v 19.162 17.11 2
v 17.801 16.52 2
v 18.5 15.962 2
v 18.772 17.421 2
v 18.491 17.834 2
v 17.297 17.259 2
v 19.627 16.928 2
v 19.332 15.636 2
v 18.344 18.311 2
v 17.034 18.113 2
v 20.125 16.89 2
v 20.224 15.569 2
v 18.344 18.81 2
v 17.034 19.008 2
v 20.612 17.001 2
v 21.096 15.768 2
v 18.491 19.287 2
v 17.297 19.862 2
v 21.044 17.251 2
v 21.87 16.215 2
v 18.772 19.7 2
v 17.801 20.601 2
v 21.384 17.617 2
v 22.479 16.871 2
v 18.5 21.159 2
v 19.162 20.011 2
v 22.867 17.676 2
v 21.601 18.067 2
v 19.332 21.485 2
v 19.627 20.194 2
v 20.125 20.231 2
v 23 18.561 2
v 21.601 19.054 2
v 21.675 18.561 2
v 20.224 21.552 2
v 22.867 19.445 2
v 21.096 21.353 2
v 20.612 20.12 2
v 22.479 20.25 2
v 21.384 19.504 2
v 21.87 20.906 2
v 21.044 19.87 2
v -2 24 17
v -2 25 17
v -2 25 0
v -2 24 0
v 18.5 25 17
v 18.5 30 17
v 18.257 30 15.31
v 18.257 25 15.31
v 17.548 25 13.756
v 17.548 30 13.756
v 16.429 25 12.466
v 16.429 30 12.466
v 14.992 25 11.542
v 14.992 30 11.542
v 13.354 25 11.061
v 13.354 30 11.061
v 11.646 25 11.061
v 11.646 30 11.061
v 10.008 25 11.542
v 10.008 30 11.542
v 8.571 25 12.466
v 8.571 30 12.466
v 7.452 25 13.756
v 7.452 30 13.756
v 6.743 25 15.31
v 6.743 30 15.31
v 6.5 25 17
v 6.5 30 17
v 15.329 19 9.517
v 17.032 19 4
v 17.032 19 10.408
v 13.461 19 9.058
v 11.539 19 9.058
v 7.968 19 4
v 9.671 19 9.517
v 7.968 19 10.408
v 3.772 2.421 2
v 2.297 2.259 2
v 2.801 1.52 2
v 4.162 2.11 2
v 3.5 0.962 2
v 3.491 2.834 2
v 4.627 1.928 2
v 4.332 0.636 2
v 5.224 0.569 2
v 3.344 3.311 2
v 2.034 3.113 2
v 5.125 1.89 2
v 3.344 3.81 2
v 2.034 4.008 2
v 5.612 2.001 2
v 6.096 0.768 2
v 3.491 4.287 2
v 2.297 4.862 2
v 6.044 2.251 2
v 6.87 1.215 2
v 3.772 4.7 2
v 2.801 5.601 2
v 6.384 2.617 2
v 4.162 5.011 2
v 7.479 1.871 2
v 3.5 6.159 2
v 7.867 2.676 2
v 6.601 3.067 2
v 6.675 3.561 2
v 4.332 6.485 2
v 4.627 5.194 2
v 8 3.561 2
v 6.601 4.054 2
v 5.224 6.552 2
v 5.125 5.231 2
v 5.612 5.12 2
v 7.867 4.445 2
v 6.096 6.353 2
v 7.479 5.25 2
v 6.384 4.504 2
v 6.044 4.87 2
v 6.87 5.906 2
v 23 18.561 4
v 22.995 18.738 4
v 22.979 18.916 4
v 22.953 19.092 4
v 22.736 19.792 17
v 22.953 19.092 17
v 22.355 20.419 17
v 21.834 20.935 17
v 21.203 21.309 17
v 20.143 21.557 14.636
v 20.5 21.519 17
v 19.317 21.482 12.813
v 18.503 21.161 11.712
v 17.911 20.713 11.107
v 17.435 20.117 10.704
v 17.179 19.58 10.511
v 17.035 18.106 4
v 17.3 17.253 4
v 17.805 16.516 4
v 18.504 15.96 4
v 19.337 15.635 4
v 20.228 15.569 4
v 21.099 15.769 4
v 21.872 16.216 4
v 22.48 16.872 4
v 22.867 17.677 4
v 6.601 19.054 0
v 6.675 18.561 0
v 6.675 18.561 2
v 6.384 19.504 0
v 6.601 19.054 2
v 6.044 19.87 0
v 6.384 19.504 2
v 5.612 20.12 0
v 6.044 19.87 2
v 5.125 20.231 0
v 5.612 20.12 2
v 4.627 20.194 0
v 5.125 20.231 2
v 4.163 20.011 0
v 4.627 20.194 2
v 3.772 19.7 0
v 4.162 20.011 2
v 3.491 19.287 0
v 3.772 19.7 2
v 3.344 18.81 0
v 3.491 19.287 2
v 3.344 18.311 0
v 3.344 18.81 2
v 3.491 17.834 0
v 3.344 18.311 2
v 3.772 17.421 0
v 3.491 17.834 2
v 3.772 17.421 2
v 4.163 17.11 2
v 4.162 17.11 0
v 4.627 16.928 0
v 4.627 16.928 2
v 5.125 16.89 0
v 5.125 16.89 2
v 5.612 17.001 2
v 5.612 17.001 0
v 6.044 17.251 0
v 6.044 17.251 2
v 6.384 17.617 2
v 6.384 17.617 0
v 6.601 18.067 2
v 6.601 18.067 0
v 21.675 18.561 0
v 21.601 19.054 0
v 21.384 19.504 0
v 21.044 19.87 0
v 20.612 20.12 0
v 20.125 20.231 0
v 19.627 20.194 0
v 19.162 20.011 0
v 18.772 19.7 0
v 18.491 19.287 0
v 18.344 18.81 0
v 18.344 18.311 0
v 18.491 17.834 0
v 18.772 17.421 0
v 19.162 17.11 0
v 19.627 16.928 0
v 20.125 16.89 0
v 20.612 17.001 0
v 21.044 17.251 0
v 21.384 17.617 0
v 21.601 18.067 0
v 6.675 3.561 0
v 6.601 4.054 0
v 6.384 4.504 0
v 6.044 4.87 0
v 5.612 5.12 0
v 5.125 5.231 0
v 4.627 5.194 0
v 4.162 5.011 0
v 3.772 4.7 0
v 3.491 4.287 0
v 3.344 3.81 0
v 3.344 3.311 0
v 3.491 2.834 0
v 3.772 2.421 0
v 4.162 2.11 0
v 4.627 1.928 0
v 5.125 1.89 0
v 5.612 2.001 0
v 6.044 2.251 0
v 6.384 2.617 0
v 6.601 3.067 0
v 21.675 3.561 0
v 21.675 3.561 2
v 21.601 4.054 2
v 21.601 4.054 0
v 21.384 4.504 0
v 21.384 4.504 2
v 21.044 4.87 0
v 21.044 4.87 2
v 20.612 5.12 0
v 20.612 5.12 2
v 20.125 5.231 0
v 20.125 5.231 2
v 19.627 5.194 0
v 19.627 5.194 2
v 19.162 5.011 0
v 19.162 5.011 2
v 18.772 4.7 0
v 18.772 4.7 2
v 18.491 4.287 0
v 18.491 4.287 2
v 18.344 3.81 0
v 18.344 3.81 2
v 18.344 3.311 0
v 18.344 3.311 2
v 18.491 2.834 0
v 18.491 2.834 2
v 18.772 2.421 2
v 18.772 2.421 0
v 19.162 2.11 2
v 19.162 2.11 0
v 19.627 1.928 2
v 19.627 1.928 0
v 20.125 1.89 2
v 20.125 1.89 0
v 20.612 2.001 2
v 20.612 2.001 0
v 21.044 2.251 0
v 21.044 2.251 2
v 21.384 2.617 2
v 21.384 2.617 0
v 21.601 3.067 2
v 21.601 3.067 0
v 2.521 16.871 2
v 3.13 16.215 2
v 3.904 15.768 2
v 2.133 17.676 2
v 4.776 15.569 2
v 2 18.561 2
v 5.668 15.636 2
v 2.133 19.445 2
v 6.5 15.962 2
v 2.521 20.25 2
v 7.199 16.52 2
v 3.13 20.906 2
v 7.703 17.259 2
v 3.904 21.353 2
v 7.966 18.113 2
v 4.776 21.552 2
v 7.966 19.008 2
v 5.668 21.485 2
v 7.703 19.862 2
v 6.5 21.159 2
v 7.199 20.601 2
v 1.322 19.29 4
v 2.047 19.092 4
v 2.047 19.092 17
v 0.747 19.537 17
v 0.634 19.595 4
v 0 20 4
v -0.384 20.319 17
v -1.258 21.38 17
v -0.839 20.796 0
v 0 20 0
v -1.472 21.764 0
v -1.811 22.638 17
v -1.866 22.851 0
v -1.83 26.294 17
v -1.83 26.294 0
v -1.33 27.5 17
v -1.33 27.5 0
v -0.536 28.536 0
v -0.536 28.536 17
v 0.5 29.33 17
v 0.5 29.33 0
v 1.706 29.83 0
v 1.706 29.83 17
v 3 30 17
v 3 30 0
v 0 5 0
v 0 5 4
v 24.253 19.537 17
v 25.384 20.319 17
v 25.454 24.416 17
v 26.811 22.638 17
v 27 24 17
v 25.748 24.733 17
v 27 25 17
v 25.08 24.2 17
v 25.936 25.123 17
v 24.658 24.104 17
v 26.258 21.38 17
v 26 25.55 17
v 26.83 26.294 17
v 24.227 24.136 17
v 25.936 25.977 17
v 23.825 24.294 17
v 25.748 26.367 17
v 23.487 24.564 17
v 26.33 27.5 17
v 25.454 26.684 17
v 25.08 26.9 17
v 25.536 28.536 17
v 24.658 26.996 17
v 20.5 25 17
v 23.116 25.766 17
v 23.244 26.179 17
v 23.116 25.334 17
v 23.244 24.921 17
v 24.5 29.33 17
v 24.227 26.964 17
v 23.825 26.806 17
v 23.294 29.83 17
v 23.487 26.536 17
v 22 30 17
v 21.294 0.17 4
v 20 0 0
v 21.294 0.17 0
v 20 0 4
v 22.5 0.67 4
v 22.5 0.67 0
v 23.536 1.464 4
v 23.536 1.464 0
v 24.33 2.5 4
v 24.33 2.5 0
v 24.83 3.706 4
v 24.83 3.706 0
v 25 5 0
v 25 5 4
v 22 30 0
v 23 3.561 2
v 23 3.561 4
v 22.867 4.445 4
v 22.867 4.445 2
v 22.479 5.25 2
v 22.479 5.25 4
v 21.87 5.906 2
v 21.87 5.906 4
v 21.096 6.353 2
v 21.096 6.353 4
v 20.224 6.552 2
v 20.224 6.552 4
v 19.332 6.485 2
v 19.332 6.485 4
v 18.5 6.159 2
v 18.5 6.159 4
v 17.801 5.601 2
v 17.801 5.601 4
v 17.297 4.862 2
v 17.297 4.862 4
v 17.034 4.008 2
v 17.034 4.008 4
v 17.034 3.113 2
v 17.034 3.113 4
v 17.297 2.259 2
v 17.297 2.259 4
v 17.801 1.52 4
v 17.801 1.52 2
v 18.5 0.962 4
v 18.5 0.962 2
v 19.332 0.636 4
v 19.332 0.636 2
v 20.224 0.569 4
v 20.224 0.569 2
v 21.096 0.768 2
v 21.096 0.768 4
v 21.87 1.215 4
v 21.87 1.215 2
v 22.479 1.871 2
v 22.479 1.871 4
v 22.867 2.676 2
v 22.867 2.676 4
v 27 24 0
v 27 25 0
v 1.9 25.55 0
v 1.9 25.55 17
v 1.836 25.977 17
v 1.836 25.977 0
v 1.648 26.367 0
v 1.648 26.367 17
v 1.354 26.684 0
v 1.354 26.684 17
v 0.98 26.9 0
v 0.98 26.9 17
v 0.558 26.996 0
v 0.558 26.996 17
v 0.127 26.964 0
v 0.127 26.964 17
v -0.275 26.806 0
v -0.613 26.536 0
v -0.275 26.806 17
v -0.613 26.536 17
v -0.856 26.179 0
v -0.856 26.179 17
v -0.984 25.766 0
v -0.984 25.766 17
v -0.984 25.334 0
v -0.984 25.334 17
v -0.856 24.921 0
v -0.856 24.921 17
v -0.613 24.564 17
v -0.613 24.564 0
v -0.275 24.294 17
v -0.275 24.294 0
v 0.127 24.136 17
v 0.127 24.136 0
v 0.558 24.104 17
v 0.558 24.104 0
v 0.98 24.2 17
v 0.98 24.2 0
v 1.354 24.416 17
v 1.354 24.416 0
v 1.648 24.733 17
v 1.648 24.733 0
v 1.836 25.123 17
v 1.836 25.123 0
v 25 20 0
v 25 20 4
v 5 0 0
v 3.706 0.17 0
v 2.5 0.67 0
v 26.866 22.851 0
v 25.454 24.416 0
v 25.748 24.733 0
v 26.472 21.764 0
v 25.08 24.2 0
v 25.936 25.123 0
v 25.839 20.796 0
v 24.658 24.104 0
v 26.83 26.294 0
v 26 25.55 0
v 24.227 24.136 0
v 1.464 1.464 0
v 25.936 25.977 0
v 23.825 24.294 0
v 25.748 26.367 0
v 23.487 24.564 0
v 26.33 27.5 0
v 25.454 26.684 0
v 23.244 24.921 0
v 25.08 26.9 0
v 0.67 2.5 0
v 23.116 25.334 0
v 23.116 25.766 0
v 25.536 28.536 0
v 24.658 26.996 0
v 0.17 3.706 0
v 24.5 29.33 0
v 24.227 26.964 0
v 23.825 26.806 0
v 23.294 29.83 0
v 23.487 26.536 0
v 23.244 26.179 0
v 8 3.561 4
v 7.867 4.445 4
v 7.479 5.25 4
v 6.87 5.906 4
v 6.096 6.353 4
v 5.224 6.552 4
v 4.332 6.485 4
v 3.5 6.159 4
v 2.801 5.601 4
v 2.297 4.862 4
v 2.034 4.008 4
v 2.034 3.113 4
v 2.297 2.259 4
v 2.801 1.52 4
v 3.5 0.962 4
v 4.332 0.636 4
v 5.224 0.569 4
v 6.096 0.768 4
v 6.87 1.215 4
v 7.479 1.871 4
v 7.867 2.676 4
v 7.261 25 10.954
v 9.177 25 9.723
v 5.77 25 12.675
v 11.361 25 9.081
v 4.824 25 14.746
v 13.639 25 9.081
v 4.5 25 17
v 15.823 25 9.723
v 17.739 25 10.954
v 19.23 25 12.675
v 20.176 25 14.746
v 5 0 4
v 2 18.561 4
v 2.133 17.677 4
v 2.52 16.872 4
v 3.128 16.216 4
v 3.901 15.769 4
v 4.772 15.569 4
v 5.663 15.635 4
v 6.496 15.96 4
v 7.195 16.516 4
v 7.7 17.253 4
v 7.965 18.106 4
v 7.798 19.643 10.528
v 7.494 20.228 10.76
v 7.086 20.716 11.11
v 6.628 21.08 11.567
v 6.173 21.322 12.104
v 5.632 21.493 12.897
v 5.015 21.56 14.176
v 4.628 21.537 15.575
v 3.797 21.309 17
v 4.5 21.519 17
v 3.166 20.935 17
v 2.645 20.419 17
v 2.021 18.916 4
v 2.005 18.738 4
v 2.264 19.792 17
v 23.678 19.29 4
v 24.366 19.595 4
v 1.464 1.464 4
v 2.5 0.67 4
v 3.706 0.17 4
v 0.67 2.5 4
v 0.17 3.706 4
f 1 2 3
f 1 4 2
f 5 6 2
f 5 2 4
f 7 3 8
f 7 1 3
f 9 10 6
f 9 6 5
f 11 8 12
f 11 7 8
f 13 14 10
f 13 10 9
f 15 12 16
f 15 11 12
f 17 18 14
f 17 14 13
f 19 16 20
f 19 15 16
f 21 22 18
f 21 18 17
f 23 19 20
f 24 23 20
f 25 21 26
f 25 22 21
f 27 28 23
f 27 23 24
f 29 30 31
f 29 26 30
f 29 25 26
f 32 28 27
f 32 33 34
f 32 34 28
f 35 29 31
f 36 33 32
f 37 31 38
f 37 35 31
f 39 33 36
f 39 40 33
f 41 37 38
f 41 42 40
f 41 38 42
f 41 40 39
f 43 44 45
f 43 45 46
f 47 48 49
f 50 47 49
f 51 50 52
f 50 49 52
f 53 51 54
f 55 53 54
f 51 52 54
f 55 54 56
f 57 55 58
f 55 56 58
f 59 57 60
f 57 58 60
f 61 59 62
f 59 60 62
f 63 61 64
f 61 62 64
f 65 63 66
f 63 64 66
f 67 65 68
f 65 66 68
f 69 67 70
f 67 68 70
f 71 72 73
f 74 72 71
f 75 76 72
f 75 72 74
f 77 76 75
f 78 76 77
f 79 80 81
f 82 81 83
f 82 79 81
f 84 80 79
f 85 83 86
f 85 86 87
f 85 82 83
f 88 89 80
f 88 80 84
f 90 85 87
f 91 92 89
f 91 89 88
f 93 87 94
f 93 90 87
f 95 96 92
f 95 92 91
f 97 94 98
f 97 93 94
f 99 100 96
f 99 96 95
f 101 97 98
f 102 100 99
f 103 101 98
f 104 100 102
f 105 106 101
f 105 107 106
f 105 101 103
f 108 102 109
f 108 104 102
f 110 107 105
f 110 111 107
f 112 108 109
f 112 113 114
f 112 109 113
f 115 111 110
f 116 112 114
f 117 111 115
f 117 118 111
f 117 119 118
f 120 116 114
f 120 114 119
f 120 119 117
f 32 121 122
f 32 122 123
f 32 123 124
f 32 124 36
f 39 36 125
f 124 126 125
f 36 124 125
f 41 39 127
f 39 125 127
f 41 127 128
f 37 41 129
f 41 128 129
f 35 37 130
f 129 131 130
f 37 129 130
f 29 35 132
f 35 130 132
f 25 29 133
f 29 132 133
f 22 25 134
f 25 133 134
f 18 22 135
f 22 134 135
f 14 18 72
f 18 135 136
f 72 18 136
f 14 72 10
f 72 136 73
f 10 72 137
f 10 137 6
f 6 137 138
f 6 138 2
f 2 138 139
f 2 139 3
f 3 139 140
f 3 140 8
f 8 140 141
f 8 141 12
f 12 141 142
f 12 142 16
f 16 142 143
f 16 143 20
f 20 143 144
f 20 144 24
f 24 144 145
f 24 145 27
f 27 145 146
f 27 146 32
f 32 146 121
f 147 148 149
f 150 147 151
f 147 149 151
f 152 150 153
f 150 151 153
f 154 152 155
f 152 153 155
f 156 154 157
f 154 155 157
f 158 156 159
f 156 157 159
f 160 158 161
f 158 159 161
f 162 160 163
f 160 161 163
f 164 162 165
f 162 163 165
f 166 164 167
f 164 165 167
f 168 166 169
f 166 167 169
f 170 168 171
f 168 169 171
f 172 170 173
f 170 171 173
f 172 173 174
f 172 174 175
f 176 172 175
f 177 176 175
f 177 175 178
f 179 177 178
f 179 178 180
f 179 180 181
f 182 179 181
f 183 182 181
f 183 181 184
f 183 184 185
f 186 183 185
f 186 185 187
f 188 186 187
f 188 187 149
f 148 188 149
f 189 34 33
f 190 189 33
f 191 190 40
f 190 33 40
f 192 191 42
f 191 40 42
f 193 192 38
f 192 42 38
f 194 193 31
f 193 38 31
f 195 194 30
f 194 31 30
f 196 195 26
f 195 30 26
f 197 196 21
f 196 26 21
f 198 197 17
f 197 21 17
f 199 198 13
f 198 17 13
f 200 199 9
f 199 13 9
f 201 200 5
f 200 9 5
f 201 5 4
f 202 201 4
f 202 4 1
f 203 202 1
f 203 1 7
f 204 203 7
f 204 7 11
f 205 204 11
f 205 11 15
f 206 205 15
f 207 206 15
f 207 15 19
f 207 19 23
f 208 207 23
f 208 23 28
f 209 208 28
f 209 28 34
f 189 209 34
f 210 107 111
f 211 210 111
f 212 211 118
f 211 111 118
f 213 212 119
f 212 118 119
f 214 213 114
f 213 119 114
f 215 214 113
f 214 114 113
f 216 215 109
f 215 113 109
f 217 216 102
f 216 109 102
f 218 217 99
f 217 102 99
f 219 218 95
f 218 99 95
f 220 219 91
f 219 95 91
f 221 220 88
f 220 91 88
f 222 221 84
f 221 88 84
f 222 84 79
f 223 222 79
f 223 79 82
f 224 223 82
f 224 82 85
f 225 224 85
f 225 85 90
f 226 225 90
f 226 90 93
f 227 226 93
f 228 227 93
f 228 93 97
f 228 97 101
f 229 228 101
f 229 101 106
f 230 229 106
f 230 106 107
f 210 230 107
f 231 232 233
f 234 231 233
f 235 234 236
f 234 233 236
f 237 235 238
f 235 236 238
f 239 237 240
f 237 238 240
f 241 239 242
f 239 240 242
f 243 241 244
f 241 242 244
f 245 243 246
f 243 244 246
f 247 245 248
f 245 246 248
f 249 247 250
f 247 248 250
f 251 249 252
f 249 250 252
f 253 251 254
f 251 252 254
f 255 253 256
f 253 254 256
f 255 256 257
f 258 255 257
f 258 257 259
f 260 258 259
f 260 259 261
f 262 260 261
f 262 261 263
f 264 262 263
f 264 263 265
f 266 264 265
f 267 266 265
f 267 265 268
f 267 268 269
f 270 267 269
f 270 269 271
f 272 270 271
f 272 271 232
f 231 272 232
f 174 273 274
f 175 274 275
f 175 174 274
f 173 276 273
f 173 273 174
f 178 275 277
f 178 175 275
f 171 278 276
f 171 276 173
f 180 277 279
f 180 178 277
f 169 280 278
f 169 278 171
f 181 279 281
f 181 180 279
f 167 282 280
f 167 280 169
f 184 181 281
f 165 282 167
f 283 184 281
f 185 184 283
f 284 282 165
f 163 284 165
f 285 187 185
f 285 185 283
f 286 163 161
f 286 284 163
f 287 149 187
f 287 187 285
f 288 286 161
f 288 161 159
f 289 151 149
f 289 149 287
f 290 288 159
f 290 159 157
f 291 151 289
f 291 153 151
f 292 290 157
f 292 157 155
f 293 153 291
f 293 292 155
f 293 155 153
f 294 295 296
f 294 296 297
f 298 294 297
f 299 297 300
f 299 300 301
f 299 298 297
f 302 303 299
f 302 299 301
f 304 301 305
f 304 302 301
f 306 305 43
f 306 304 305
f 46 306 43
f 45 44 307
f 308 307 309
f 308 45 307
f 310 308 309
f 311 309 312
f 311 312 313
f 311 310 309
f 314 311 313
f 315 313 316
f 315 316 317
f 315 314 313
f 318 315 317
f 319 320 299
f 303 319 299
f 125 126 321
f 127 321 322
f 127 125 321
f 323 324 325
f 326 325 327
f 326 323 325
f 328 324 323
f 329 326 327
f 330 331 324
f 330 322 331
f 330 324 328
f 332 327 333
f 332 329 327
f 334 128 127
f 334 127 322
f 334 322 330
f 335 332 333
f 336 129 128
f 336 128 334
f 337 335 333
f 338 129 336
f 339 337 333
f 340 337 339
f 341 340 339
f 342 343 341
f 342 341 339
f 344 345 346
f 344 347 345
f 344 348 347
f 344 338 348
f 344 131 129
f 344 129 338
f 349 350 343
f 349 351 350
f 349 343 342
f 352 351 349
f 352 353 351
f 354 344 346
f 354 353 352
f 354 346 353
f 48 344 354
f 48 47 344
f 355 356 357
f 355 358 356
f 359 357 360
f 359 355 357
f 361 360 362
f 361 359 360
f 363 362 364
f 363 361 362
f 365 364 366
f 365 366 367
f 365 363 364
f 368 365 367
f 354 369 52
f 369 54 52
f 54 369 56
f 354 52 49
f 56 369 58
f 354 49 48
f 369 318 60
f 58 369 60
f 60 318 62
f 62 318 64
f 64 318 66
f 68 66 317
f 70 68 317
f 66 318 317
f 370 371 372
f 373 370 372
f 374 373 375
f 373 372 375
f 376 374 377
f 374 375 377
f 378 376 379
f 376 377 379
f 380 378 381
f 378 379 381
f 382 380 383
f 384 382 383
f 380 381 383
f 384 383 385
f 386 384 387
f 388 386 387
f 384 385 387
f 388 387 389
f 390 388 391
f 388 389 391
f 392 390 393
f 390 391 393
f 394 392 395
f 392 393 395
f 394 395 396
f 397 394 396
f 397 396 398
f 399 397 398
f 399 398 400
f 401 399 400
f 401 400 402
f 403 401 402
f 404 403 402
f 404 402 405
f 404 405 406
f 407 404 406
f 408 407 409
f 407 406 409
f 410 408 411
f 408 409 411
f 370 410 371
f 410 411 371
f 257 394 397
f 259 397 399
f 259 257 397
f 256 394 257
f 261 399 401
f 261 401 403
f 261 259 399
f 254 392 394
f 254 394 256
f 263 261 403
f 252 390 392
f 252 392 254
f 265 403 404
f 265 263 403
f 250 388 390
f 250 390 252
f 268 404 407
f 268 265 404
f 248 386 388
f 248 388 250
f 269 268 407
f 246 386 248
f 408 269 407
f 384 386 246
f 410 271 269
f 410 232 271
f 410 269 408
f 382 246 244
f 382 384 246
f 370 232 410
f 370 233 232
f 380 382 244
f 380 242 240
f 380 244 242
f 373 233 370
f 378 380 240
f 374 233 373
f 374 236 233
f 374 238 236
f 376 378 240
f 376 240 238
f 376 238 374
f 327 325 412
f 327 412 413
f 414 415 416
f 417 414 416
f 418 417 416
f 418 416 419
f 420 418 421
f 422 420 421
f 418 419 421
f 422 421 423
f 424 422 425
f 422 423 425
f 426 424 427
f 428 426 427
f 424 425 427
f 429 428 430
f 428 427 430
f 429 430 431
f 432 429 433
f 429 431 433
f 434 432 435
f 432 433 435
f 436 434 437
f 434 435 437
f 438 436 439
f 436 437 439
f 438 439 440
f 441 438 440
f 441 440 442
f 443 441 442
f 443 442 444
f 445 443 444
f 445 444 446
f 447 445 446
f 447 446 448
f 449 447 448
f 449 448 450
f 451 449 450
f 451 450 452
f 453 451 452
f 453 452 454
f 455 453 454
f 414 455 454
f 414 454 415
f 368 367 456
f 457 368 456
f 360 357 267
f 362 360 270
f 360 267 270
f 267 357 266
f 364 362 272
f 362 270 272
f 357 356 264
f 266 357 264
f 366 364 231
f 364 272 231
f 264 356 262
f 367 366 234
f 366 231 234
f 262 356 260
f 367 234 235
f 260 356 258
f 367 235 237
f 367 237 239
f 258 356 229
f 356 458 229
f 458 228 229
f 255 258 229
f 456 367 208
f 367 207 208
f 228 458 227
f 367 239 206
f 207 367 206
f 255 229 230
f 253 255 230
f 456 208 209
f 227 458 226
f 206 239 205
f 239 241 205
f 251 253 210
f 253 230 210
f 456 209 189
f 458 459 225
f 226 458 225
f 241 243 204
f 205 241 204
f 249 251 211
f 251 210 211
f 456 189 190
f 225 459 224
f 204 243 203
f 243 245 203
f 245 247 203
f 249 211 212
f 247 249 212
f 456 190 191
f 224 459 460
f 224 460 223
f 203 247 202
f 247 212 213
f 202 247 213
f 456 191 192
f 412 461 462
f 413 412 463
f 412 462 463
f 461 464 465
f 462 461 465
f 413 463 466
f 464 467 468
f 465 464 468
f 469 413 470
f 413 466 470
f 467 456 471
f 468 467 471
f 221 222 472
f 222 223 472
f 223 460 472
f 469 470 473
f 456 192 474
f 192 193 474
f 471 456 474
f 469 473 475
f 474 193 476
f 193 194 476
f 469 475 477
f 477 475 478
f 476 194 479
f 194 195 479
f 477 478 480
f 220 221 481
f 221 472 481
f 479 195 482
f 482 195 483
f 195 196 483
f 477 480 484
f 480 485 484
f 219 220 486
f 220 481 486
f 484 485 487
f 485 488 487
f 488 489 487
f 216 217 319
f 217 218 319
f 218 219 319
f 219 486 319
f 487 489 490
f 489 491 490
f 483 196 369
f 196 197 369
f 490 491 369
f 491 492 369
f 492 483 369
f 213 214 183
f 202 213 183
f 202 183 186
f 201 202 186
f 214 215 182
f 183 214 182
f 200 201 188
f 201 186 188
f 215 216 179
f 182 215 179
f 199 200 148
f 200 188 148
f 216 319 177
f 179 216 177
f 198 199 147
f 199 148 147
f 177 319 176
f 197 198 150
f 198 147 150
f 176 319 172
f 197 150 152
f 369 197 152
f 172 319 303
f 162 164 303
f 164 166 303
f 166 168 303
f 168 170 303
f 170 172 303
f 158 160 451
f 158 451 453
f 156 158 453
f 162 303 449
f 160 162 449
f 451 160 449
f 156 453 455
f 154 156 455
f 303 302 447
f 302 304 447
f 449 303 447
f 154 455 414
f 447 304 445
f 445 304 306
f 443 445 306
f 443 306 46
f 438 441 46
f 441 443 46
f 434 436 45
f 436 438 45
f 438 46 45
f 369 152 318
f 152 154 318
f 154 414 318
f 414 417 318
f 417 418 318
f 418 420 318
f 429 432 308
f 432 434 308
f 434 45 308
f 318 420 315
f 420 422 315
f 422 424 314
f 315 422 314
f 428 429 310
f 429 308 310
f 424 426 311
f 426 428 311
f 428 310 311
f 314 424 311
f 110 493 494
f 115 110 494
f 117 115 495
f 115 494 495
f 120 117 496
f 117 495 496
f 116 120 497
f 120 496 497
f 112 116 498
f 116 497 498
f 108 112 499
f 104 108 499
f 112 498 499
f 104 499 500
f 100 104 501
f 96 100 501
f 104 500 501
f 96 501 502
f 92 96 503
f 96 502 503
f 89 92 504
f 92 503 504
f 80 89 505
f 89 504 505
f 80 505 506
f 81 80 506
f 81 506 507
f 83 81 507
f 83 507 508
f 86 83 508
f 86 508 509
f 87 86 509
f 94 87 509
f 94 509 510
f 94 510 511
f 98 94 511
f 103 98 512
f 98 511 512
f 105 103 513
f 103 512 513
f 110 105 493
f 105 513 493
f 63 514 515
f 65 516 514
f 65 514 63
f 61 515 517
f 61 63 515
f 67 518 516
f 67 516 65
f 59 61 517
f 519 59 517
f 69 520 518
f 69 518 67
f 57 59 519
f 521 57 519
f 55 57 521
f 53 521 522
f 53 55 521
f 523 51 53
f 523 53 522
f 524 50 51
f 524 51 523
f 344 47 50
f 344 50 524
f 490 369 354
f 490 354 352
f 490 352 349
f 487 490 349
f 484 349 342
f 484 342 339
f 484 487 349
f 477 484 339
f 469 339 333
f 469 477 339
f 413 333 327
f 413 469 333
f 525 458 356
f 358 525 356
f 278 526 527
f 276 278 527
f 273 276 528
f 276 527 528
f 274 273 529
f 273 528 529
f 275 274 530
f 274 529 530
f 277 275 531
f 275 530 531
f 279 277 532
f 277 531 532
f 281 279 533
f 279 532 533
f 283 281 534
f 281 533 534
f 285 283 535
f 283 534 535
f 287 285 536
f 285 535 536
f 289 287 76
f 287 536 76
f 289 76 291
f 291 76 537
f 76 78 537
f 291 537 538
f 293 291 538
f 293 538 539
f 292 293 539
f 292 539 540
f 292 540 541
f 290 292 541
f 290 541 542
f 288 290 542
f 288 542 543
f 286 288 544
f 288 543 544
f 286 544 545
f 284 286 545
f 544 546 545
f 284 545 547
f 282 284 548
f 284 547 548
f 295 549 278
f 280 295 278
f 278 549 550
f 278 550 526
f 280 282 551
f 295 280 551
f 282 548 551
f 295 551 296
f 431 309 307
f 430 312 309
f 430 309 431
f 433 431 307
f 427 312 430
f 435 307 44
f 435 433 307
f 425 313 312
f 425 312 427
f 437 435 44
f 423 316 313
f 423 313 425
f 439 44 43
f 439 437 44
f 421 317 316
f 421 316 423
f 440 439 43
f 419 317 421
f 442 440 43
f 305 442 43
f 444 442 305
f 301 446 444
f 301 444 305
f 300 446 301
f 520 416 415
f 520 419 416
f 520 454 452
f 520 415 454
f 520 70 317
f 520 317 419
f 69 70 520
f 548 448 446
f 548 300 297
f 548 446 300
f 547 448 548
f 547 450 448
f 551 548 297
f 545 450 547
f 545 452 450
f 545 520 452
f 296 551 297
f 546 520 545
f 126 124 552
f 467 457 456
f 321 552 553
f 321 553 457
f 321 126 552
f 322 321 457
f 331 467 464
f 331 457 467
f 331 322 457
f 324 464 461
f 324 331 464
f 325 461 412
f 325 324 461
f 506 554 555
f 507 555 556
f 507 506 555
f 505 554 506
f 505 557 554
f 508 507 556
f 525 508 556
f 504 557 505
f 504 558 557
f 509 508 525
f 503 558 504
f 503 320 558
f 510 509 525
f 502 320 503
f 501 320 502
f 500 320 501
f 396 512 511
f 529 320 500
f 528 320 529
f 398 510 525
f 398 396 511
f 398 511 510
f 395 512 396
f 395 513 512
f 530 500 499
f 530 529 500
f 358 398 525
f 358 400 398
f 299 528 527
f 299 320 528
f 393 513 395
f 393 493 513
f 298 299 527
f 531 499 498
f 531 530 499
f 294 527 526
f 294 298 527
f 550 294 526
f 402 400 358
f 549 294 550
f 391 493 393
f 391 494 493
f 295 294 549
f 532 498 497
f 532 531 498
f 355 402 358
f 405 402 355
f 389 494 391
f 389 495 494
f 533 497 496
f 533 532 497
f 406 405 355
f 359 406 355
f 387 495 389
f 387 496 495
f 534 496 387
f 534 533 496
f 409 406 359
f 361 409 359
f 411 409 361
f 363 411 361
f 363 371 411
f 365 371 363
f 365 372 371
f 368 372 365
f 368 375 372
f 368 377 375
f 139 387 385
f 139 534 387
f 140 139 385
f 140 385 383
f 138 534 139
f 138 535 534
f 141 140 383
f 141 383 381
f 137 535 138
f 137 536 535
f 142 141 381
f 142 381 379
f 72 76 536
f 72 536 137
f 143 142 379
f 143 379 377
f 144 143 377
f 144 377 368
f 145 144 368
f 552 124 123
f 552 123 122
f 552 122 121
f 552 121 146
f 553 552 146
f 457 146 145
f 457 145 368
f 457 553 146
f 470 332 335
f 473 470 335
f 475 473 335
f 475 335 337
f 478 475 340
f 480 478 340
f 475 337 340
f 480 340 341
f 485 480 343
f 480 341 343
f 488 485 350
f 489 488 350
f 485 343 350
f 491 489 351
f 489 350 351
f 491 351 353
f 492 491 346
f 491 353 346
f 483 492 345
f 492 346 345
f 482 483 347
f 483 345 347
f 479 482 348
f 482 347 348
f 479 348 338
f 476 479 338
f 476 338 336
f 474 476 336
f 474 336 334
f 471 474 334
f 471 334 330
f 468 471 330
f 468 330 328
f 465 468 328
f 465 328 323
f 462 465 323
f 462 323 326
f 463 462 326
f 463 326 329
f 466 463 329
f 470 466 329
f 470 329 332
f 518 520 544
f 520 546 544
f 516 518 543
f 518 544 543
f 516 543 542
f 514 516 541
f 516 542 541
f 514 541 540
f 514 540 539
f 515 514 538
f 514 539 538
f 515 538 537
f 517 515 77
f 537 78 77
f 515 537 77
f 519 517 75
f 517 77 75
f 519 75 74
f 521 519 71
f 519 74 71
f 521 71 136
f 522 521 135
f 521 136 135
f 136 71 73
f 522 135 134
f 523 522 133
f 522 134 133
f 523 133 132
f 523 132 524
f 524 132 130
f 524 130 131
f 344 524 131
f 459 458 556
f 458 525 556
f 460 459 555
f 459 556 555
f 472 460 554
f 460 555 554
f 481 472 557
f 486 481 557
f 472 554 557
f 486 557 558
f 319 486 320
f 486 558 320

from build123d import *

# Parameters (mm, degrees)
F0_W          = 25
F0_H          = 30
F1_DEPTH      = 4
F2_R          = 1.675
F3_DEPTH      = 25
F4_W          = 25
F4_H          = 11
F5_DEPTH      = 13
F7_DEPTH      = 6
F8_R          = 8
F9_DEPTH      = 6
F2_R_2        = 3
F10_DEPTH     = 2
F11_W         = 11
F11_H         = 17
F12_DEPTH     = 2
F13_R         = 5
F14_W         = 11
F14_H         = 17
F15_DEPTH     = 2
F16_DEPTH     = 2
F17_R         = 1.45
F18_DEPTH     = 25
F19_T1_DEPTH  = 42
F19_T6_DEPTH  = 42
F19_T11_DEPTH = 42
F19_T16_DEPTH = 42
F19_T21_DEPTH = 42
F20_DEPTH     = 25


# Not quite as in the source:
# - a fillet or chamfer that OpenCascade refuses, or shapes differently, is made with other operations: its cross-section is extruded or revolved along the edge and cut away or added


with BuildPart() as f1:
    # F0 (on Top) → F1 (new body)
    with BuildSketch(Plane.XY):
        with Locations((12.5, 15)):
            Rectangle(F0_W, F0_H)
    extrude(amount=F1_DEPTH)

    # F2 (on face) → F3 (cut)
    with BuildSketch(Plane.XY.offset(4)):
        with BuildLine():
            ThreePointArc((3.325, 18.5605346784), (5, 16.8855346784), (6.675, 18.5605346784))
            ThreePointArc((6.675, 18.5605346784), (5, 20.2355346784), (3.325, 18.5605346784))
        make_face()
        with Locations((20, 18.5605346784)):
            Circle(F2_R)
        with Locations((20, 3.5605346784)):
            Circle(F2_R)
        with Locations((5, 3.5605346784)):
            Circle(F2_R)
    extrude(amount=-F3_DEPTH, mode=Mode.SUBTRACT)

    # F4 (on face) → F5 (join)
    with BuildSketch(Plane.XY.offset(4)):
        with Locations((12.5, 24.5)):
            Rectangle(F4_W, F4_H)
    extrude(amount=F5_DEPTH)

    # F6 (on face) → F7 (cut)
    with BuildSketch(Plane(origin=(0, 30, 0), x_dir=(-1, 0, 0), z_dir=(0, 1, 0))):
        with BuildLine():
            ThreePointArc((-18.5, 17), (-12.5, 11), (-6.5, 17))
            Line((-6.5, 17), (-18.5, 17))
        make_face()
    extrude(amount=-F7_DEPTH, mode=Mode.SUBTRACT)

    # F8 (on face) → F9 (cut)
    with BuildSketch(Plane.XZ.offset(-19)):
        with Locations((12.5, 17)):
            Circle(F8_R)
    extrude(amount=-F9_DEPTH, mode=Mode.SUBTRACT)

    # F2 (on face) → F10 (cut)
    with BuildSketch(Plane.XY.offset(4)):
        with BuildLine():
            ThreePointArc((8, 18.5605346784), (5, 21.5605346784), (2, 18.5605346784))
            ThreePointArc((2, 18.5605346784), (5, 15.5605346784), (8, 18.5605346784))
        make_face()
        with BuildLine():
            ThreePointArc((3.325, 18.5605346784), (5, 20.2355346784), (6.675, 18.5605346784))
            ThreePointArc((6.675, 18.5605346784), (5, 16.8855346784), (3.325, 18.5605346784))
        make_face(mode=Mode.SUBTRACT)
        with Locations((20, 18.5605346784)):
            Circle(F2_R_2)
        with Locations((20, 18.5605346784)):
            Circle(F2_R, mode=Mode.SUBTRACT)
        with Locations((20, 3.5605346784)):
            Circle(F2_R_2)
        with Locations((20, 3.5605346784)):
            Circle(F2_R, mode=Mode.SUBTRACT)
        with Locations((5, 3.5605346784)):
            Circle(F2_R_2)
        with Locations((5, 3.5605346784)):
            Circle(F2_R, mode=Mode.SUBTRACT)
    extrude(amount=-F10_DEPTH, mode=Mode.SUBTRACT)

    # F11 (on face) → F12 (join)
    with BuildSketch(Plane(origin=(0, 0, 0), x_dir=(0, -1, 0), z_dir=(-1, 0, 0))):
        with Locations((-24.5, 8.5)):
            Rectangle(F11_W, F11_H)
    extrude(amount=F12_DEPTH)

    # F13
    f13_edges = [f1.edges().sort_by_distance(p)[0] for p in [
        (0, 0, 2),
        (25, 0, 2),
    ]]
    fillet(f13_edges, radius=F13_R)

    # F14 (on face) → F15 (join)
    with BuildSketch(Plane.YZ.offset(25)):
        with Locations((24.5, 8.5)):
            Rectangle(F14_W, F14_H)
    extrude(amount=F15_DEPTH)

    # F14 (on face) → F16 (join)
    with BuildSketch(Plane.YZ.offset(25)):
        with Locations((24.5, 8.5)):
            Rectangle(F14_W, F14_H)
    extrude(amount=F16_DEPTH)

    # F17 (on face) → F18 (cut)
    with BuildSketch(Plane.XY.offset(17)):
        with Locations((0.45, 25.55)):
            Circle(F17_R)
        with Locations((24.55, 25.55)):
            Circle(F17_R)
    extrude(amount=-F18_DEPTH, mode=Mode.SUBTRACT)

    # F19: fillet of radius 5 on 4 edges, made by hand

    # F19_s2 → F19_t1 (cut)
    with BuildSketch(Plane.XY.offset(-12.5)):
        with BuildLine():
            ThreePointArc((-2, 25), (-0.5355339059, 28.5355339059), (3, 30))
            Line((3, 30), (-2, 30))
            Line((-2, 30), (-2, 25))
        make_face()
        with BuildLine():
            ThreePointArc((22, 30), (25.5355339059, 28.5355339059), (27, 25))
            Line((27, 25), (27, 30))
            Line((27, 30), (22, 30))
        make_face()
    extrude(amount=F19_T1_DEPTH, mode=Mode.SUBTRACT)


with BuildPart() as f19_tool4:
    # F19_s5 → F19_t6 (new body)
    with BuildSketch(Plane.XY.offset(-12.5)):
        with BuildLine():
            ThreePointArc((3, 19), (-0.5355339059, 20.4644660941), (-2, 24))
            Line((-2, 24), (-2, 19))
            Line((-2, 19), (3, 19))
        make_face()
    extrude(amount=F19_T6_DEPTH)

    split(bisect_by=Plane.YZ, keep=Keep.BOTTOM)


with BuildPart() as f1_1:
    add(f1.part)

    # F19_t3: cut F19_tool4
    add(f19_tool4.part, mode=Mode.SUBTRACT)


with BuildPart() as f19_tool9:
    # F19_s10 → F19_t11 (new body)
    with BuildSketch(Plane.XY.offset(-12.5)):
        with BuildLine():
            ThreePointArc((3, 19), (-0.5355339059, 20.4644660941), (-2, 24))
            Line((-2, 24), (-2, 19))
            Line((-2, 19), (3, 19))
        make_face()
    extrude(amount=F19_T11_DEPTH)

    split(bisect_by=Plane.XY.offset(4), keep=Keep.TOP)


with BuildPart() as f1_2:
    add(f1_1.part)

    # F19_t8: cut F19_tool9
    add(f19_tool9.part, mode=Mode.SUBTRACT)


with BuildPart() as f19_tool14:
    # F19_s15 → F19_t16 (new body)
    with BuildSketch(Plane.XY.offset(29.5)):
        with BuildLine():
            ThreePointArc((22, 19), (25.5355339059, 20.4644660941), (27, 24))
            Line((27, 24), (27, 19))
            Line((27, 19), (22, 19))
        make_face()
    extrude(amount=-F19_T16_DEPTH)

    split(bisect_by=Plane.XY.offset(4), keep=Keep.TOP)


with BuildPart() as f1_3:
    add(f1_2.part)

    # F19_t13: cut F19_tool14
    add(f19_tool14.part, mode=Mode.SUBTRACT)


with BuildPart() as f19_tool19:
    # F19_s20 → F19_t21 (new body)
    with BuildSketch(Plane.XY.offset(29.5)):
        with BuildLine():
            ThreePointArc((22, 19), (25.5355339059, 20.4644660941), (27, 24))
            Line((27, 24), (27, 19))
            Line((27, 19), (22, 19))
        make_face()
    extrude(amount=-F19_T21_DEPTH)

    split(bisect_by=Plane.YZ.offset(25), keep=Keep.TOP)


with BuildPart() as f1_4:
    add(f1_3.part)

    # F19_t18: cut F19_tool19
    add(f19_tool19.part, mode=Mode.SUBTRACT)

    # F2 (on face) → F20 (cut)
    with BuildSketch(Plane.XY.offset(4)):
        with BuildLine():
            ThreePointArc((8, 18.5605346784), (5, 21.5605346784), (2, 18.5605346784))
            ThreePointArc((2, 18.5605346784), (5, 15.5605346784), (8, 18.5605346784))
        make_face()
        with BuildLine():
            ThreePointArc((3.325, 18.5605346784), (5, 20.2355346784), (6.675, 18.5605346784))
            ThreePointArc((6.675, 18.5605346784), (5, 16.8855346784), (3.325, 18.5605346784))
        make_face(mode=Mode.SUBTRACT)
        with Locations((20, 18.5605346784)):
            Circle(F2_R_2)
        with Locations((20, 18.5605346784)):
            Circle(F2_R, mode=Mode.SUBTRACT)
        with BuildLine():
            ThreePointArc((3.325, 18.5605346784), (5, 16.8855346784), (6.675, 18.5605346784))
            ThreePointArc((6.675, 18.5605346784), (5, 20.2355346784), (3.325, 18.5605346784))
        make_face()
        with Locations((20, 18.5605346784)):
            Circle(F2_R)
    extrude(amount=F20_DEPTH, mode=Mode.SUBTRACT)


solid = f1_4.part
